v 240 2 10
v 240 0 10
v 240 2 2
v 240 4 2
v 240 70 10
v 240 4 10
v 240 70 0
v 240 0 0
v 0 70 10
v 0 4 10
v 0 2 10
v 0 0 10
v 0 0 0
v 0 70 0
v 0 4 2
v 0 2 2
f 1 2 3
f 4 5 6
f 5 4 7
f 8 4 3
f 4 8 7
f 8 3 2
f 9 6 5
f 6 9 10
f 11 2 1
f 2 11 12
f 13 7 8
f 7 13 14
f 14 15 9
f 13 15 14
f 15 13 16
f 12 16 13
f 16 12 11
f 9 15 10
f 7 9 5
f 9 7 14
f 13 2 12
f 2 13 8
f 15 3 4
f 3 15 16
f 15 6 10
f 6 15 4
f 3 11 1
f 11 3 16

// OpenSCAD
// file: PhotoVars.scad
WideX=240;
DepthY=190;
Thick=2;
Buff=1;
SlottH=8;
ConnY=10;
BeamX=10;
DB=Buff*2;
ConnZ=Thick*3;

BaseDepthY=70;
BaseHeightZ=10;

BoxDepthY=40;
BoxH=30;
Wall=3;
Brim=2;
DBR=Brim*2;

LidZ=3;
LidX=WideX-DBR;
LidY=BoxDepthY-DBR-ConnZ;

DW=Wall*2;
// main file
include <PhotoVars.scad>;

difference()
{
  cube([WideX,BaseDepthY,BaseHeightZ]);
  translate([-Buff,Thick,Thick]) cube([WideX+DB,Thick,BaseHeightZ]);
}
